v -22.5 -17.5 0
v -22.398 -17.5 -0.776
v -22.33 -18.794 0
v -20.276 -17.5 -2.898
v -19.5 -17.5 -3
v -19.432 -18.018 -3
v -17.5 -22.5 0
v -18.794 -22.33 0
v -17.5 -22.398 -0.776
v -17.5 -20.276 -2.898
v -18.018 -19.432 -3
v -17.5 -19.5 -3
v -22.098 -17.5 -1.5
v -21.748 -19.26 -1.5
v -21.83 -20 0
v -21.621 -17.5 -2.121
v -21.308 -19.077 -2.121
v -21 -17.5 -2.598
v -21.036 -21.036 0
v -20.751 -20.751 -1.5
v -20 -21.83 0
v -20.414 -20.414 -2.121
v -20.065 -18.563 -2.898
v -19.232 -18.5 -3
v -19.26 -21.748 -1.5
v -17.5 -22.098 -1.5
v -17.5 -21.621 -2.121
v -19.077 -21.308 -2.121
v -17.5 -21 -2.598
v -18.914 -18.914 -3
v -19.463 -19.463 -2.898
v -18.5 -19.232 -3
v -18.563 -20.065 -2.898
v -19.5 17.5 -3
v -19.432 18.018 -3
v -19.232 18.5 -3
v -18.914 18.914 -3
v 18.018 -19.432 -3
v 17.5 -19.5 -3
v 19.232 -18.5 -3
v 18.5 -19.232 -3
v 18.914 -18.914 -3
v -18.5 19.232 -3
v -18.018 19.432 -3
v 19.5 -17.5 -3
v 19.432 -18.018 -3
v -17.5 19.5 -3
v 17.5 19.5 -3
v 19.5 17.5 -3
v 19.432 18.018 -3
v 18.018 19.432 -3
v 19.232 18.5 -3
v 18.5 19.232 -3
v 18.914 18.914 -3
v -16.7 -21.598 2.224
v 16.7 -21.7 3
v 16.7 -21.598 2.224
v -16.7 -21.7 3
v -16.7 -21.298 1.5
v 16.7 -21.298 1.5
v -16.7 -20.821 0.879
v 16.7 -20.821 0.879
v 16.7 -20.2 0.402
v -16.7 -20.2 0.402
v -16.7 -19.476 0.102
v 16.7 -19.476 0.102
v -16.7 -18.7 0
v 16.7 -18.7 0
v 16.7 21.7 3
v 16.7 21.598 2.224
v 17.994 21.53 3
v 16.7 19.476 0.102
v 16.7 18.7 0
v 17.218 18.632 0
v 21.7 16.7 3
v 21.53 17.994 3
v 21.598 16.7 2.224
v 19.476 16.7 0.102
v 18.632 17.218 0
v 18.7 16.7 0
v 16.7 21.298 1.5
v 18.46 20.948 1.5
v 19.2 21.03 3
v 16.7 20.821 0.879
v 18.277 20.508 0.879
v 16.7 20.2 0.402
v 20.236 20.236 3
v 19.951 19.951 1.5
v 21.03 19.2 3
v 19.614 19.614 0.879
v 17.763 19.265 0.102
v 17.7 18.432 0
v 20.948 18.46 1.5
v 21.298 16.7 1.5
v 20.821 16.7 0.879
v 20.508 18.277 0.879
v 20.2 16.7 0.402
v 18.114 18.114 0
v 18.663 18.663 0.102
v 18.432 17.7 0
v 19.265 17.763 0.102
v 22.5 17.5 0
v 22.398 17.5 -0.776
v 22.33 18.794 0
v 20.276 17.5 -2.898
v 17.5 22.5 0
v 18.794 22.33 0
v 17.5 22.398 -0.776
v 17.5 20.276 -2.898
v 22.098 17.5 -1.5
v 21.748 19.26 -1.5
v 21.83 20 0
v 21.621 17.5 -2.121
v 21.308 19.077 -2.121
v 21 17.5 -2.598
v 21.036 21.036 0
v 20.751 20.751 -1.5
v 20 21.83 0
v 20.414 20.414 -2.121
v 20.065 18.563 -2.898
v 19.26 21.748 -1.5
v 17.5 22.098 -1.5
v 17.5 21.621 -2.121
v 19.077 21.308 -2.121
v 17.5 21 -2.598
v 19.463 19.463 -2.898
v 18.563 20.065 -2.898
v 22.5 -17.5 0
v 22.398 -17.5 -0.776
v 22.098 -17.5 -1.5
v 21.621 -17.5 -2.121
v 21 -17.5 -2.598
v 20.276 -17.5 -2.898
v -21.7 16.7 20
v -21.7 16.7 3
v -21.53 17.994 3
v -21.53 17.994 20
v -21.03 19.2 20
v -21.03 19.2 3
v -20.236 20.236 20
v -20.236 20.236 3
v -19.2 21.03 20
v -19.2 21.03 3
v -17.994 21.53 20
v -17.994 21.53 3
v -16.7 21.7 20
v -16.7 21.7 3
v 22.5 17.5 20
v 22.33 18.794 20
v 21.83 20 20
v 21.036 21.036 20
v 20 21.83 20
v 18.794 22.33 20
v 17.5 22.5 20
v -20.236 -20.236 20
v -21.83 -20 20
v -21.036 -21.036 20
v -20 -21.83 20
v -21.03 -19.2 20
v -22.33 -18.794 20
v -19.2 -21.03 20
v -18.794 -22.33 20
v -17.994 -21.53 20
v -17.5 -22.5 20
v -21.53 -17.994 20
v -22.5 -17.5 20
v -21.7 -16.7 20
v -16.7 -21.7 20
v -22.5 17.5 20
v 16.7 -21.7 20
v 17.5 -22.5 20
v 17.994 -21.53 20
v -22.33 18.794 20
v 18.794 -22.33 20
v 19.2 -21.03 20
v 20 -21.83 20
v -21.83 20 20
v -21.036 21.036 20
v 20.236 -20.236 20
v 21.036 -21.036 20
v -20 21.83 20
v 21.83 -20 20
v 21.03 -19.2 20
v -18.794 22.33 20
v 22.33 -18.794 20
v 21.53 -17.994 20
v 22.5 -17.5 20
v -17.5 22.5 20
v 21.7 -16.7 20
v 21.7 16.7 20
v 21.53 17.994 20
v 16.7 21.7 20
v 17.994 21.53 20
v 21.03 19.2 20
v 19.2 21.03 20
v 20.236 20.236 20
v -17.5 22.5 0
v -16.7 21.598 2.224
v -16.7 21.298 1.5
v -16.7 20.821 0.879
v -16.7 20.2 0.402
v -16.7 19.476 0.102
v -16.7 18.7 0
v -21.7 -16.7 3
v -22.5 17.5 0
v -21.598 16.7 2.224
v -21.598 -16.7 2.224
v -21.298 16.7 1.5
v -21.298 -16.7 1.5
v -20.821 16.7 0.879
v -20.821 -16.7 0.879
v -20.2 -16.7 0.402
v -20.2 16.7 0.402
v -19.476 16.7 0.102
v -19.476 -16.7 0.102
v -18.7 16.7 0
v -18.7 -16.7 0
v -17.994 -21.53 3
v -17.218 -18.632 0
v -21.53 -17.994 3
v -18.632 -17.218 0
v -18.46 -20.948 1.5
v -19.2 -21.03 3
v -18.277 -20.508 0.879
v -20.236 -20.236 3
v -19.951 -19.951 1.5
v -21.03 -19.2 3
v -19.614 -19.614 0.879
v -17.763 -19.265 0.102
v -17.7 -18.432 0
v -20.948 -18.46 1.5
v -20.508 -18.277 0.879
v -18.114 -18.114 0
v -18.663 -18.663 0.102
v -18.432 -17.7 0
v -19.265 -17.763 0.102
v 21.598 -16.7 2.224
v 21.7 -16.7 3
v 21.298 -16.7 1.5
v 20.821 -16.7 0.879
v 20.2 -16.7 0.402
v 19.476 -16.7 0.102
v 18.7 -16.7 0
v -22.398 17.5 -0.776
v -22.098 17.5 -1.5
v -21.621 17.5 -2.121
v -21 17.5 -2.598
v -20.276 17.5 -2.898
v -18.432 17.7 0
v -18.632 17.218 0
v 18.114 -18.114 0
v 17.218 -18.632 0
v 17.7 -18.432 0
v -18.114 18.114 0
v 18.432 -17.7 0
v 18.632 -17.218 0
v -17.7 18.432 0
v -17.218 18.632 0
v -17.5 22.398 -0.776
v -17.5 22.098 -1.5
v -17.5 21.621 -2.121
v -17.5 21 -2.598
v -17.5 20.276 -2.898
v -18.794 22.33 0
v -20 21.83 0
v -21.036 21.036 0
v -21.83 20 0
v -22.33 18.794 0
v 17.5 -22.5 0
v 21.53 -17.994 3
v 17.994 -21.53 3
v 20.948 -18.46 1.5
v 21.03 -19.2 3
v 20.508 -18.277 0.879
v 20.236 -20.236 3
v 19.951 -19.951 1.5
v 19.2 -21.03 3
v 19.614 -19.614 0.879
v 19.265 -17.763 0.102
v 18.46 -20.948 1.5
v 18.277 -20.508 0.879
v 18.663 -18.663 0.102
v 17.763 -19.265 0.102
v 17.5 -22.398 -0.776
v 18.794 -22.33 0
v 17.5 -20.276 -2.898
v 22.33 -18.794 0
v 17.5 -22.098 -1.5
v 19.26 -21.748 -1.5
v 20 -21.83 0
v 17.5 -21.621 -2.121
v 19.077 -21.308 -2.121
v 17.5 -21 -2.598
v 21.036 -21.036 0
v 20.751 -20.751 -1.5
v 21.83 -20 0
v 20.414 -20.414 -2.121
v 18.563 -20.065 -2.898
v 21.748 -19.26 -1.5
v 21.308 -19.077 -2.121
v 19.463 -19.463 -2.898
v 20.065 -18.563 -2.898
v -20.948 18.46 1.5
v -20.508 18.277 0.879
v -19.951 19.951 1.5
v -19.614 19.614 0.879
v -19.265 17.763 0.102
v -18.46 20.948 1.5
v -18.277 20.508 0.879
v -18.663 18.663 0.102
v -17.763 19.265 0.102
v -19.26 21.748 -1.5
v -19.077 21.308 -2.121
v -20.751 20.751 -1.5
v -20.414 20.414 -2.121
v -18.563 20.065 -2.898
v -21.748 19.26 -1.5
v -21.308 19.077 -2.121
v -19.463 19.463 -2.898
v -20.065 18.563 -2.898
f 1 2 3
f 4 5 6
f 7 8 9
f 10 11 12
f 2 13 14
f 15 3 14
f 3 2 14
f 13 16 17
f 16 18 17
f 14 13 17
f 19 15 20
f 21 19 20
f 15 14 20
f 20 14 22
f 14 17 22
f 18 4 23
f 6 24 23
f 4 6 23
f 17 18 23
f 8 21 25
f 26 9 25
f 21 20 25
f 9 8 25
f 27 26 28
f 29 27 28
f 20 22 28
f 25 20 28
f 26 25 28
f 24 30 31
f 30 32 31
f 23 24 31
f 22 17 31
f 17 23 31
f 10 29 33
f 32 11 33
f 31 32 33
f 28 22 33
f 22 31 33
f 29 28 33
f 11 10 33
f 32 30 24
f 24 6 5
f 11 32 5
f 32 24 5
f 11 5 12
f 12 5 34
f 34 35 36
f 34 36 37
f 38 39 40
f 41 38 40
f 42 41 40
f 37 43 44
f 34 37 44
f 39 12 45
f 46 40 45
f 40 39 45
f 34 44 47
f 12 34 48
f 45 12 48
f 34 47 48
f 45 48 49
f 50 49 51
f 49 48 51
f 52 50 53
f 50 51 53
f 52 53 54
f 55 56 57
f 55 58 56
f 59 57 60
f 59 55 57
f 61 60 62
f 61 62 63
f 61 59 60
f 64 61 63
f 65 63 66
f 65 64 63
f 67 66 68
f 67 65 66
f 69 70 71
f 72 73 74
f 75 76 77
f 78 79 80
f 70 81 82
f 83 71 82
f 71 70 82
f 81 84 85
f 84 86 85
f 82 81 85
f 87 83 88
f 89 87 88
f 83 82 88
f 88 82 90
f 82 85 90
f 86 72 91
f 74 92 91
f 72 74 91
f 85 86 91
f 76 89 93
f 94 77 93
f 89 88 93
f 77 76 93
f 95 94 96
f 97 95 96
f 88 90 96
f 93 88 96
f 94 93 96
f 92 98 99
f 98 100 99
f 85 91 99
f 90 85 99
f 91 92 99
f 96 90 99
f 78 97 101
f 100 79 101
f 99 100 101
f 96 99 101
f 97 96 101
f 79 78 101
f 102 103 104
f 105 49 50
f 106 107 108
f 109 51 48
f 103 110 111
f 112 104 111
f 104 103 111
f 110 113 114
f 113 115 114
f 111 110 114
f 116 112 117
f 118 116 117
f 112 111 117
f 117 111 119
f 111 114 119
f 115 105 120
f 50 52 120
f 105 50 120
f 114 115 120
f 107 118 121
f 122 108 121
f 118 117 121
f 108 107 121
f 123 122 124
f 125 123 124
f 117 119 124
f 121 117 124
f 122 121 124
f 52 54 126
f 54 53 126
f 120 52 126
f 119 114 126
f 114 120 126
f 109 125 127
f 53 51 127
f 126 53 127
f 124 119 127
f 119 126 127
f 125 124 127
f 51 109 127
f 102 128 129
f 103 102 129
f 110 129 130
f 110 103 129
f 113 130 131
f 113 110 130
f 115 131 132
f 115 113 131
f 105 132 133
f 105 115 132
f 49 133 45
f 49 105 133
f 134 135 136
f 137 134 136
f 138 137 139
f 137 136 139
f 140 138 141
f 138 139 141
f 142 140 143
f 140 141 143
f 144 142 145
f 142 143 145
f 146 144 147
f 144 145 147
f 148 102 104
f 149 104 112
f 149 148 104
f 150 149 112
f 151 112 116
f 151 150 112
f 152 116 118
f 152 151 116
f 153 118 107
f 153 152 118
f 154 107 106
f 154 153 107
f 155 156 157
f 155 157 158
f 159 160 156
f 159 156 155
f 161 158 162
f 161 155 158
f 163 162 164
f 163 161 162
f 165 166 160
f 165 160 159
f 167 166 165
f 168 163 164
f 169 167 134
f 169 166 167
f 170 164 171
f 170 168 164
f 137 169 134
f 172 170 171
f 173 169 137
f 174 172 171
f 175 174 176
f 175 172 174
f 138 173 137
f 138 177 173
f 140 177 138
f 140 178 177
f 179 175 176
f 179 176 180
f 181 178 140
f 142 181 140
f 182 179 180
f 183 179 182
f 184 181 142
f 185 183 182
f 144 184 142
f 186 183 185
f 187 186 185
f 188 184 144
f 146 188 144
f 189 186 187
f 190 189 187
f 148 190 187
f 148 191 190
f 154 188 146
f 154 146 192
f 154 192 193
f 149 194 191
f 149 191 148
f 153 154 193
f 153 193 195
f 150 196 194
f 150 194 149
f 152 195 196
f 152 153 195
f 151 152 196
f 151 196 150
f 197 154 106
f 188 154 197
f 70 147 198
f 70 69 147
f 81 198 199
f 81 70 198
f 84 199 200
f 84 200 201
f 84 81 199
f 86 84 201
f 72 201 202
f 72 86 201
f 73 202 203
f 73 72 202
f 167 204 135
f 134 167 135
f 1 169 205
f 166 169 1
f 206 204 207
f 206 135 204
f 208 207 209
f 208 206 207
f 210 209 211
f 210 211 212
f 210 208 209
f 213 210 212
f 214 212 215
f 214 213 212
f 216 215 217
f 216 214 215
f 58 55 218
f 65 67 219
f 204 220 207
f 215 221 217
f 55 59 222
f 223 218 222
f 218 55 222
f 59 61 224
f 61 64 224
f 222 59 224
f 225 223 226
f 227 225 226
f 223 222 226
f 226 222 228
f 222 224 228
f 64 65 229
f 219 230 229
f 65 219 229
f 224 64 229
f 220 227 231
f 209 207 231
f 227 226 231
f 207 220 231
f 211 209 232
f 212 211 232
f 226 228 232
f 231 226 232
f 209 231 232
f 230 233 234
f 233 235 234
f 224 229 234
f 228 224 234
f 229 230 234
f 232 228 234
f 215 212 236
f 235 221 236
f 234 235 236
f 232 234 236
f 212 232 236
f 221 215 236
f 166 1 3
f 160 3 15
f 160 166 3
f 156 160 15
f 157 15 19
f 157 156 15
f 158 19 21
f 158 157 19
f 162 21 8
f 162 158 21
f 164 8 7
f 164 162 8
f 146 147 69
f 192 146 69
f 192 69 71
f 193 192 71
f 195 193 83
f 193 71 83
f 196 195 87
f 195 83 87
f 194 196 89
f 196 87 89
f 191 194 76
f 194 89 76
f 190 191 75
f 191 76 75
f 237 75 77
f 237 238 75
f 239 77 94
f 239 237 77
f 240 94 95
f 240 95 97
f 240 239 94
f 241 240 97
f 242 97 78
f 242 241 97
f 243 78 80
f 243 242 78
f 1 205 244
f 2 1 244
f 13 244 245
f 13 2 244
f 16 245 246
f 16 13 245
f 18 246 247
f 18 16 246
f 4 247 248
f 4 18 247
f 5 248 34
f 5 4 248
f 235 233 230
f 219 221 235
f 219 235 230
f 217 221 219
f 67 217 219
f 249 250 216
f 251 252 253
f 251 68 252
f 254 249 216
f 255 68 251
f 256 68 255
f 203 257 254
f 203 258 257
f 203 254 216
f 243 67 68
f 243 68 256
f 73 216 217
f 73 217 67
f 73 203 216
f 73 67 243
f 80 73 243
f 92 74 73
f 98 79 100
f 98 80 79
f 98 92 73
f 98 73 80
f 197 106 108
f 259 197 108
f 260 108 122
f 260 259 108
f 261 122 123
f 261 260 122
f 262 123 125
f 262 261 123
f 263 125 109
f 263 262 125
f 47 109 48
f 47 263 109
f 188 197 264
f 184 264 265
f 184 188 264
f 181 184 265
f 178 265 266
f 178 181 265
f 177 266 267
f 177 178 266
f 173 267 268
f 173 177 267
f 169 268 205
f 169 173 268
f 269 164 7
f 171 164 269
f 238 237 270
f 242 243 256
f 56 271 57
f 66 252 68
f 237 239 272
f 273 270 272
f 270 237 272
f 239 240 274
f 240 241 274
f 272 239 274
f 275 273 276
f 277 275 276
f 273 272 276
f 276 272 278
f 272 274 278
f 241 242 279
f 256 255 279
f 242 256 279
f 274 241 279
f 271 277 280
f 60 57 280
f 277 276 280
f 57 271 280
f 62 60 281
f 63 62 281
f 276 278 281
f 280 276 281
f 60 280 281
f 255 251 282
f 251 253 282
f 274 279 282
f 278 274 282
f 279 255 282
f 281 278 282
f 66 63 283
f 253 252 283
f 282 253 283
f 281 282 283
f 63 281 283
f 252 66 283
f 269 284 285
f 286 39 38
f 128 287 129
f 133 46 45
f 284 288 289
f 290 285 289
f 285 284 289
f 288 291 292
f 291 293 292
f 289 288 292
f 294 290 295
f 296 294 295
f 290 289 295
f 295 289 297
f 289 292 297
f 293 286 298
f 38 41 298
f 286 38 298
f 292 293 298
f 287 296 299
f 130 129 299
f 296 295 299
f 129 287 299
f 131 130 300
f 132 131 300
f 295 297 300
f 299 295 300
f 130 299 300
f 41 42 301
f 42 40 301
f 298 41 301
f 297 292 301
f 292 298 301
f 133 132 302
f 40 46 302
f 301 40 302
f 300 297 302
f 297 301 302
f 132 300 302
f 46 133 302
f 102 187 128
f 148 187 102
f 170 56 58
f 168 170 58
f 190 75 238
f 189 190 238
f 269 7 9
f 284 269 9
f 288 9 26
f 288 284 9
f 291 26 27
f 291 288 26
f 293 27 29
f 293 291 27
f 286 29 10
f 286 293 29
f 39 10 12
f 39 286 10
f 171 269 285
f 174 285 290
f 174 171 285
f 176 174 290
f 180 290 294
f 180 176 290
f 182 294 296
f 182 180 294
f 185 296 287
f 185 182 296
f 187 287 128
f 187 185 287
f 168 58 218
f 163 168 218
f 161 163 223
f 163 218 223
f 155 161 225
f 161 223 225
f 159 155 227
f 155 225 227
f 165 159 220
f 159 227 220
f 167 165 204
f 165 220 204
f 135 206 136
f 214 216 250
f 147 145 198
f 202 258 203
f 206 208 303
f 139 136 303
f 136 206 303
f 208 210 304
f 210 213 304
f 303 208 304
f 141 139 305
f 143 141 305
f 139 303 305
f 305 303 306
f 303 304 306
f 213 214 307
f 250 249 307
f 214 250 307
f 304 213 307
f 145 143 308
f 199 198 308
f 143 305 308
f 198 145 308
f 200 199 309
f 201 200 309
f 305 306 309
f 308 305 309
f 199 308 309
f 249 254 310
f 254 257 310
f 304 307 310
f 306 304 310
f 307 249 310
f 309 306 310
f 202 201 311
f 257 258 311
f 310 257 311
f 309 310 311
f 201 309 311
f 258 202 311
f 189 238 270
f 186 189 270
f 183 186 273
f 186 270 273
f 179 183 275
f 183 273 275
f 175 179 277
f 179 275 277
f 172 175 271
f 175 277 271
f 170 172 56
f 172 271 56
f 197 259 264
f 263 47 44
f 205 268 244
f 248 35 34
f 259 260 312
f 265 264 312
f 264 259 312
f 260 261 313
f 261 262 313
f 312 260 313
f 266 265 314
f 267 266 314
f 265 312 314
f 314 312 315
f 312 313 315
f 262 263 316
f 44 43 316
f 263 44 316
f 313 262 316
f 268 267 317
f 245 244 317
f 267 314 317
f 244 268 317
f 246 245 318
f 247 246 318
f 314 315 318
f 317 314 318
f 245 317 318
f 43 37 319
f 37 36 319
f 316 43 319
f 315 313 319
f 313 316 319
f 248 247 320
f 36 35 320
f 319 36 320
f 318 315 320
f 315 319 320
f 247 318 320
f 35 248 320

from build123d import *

# Parameters (mm, degrees)
F1_DEPTH = 20
F3_DEPTH = 3
F4_R     = 3
F5_R     = 3


with BuildPart() as f1:
    # F0 (on Top) → F1 (new body)
    with BuildSketch(Plane.XY):
        with BuildLine():
            Line((-17.5, -22.5), (17.5, -22.5))
            ThreePointArc((17.5, -22.5), (21.035534, -21.035534), (22.5, -17.5))
            Line((22.5, -17.5), (22.5, 17.5))
            ThreePointArc((22.5, 17.5), (21.035534, 21.035534), (17.5, 22.5))
            Line((17.5, 22.5), (-17.5, 22.5))
            ThreePointArc((-17.5, 22.5), (-21.035534, 21.035534), (-22.5, 17.5))
            Line((-22.5, 17.5), (-22.5, -17.5))
            ThreePointArc((-22.5, -17.5), (-21.035534, -21.035534), (-17.5, -22.5))
        make_face()
        with BuildLine():
            ThreePointArc((-16.7, -21.7), (-20.235534, -20.235534), (-21.7, -16.7))
            Line((-21.7, -16.7), (-21.7, 16.7))
            ThreePointArc((-21.7, 16.7), (-20.235534, 20.235534), (-16.7, 21.7))
            Line((-16.7, 21.7), (16.7, 21.7))
            ThreePointArc((16.7, 21.7), (20.235534, 20.235534), (21.7, 16.7))
            Line((21.7, 16.7), (21.7, -16.7))
            ThreePointArc((21.7, -16.7), (20.235534, -20.235534), (16.7, -21.7))
            Line((16.7, -21.7), (-16.7, -21.7))
        make_face(mode=Mode.SUBTRACT)
    extrude(amount=F1_DEPTH)

    # F2 (on Top) → F3 (join)
    with BuildSketch(Plane.XY):
        with BuildLine():
            ThreePointArc((22.5, 17.5), (21.035534, 21.035534), (17.5, 22.5))
            Line((17.5, 22.5), (-17.5, 22.5))
            ThreePointArc((-17.5, 22.5), (-21.035534, 21.035534), (-22.5, 17.5))
            Line((-22.5, 17.5), (-22.5, -17.5))
            ThreePointArc((-22.5, -17.5), (-21.035534, -21.035534), (-17.5, -22.5))
            Line((-17.5, -22.5), (17.5, -22.5))
            ThreePointArc((17.5, -22.5), (21.035534, -21.035534), (22.5, -17.5))
            Line((22.5, -17.5), (22.5, 17.5))
        make_face()
    extrude(amount=-F3_DEPTH)

    # F4
    f4_edges = [f1.edges().sort_by_distance(p)[0] for p in [
        (22.5, 0, -3),
        (21.035534, 21.035534, -3),
        (0, 22.5, -3),
        (-21.035534, 21.035534, -3),
        (-22.5, 0, -3),
        (-21.035534, -21.035534, -3),
        (0, -22.5, -3),
        (21.035534, -21.035534, -3),
    ]]
    fillet(f4_edges, radius=F4_R)

    # F5
    f5_edges = [f1.edges().sort_by_distance(p)[0] for p in [
        (0, -21.7, 0),
        (-20.235534, -20.235534, 0),
        (-21.7, 0, 0),
        (-20.235534, 20.235534, 0),
        (0, 21.7, 0),
        (20.235534, 20.235534, 0),
        (21.7, 0, 0),
        (20.235534, -20.235534, 0),
    ]]
    fillet(f5_edges, radius=F5_R)


solid = f1.part
